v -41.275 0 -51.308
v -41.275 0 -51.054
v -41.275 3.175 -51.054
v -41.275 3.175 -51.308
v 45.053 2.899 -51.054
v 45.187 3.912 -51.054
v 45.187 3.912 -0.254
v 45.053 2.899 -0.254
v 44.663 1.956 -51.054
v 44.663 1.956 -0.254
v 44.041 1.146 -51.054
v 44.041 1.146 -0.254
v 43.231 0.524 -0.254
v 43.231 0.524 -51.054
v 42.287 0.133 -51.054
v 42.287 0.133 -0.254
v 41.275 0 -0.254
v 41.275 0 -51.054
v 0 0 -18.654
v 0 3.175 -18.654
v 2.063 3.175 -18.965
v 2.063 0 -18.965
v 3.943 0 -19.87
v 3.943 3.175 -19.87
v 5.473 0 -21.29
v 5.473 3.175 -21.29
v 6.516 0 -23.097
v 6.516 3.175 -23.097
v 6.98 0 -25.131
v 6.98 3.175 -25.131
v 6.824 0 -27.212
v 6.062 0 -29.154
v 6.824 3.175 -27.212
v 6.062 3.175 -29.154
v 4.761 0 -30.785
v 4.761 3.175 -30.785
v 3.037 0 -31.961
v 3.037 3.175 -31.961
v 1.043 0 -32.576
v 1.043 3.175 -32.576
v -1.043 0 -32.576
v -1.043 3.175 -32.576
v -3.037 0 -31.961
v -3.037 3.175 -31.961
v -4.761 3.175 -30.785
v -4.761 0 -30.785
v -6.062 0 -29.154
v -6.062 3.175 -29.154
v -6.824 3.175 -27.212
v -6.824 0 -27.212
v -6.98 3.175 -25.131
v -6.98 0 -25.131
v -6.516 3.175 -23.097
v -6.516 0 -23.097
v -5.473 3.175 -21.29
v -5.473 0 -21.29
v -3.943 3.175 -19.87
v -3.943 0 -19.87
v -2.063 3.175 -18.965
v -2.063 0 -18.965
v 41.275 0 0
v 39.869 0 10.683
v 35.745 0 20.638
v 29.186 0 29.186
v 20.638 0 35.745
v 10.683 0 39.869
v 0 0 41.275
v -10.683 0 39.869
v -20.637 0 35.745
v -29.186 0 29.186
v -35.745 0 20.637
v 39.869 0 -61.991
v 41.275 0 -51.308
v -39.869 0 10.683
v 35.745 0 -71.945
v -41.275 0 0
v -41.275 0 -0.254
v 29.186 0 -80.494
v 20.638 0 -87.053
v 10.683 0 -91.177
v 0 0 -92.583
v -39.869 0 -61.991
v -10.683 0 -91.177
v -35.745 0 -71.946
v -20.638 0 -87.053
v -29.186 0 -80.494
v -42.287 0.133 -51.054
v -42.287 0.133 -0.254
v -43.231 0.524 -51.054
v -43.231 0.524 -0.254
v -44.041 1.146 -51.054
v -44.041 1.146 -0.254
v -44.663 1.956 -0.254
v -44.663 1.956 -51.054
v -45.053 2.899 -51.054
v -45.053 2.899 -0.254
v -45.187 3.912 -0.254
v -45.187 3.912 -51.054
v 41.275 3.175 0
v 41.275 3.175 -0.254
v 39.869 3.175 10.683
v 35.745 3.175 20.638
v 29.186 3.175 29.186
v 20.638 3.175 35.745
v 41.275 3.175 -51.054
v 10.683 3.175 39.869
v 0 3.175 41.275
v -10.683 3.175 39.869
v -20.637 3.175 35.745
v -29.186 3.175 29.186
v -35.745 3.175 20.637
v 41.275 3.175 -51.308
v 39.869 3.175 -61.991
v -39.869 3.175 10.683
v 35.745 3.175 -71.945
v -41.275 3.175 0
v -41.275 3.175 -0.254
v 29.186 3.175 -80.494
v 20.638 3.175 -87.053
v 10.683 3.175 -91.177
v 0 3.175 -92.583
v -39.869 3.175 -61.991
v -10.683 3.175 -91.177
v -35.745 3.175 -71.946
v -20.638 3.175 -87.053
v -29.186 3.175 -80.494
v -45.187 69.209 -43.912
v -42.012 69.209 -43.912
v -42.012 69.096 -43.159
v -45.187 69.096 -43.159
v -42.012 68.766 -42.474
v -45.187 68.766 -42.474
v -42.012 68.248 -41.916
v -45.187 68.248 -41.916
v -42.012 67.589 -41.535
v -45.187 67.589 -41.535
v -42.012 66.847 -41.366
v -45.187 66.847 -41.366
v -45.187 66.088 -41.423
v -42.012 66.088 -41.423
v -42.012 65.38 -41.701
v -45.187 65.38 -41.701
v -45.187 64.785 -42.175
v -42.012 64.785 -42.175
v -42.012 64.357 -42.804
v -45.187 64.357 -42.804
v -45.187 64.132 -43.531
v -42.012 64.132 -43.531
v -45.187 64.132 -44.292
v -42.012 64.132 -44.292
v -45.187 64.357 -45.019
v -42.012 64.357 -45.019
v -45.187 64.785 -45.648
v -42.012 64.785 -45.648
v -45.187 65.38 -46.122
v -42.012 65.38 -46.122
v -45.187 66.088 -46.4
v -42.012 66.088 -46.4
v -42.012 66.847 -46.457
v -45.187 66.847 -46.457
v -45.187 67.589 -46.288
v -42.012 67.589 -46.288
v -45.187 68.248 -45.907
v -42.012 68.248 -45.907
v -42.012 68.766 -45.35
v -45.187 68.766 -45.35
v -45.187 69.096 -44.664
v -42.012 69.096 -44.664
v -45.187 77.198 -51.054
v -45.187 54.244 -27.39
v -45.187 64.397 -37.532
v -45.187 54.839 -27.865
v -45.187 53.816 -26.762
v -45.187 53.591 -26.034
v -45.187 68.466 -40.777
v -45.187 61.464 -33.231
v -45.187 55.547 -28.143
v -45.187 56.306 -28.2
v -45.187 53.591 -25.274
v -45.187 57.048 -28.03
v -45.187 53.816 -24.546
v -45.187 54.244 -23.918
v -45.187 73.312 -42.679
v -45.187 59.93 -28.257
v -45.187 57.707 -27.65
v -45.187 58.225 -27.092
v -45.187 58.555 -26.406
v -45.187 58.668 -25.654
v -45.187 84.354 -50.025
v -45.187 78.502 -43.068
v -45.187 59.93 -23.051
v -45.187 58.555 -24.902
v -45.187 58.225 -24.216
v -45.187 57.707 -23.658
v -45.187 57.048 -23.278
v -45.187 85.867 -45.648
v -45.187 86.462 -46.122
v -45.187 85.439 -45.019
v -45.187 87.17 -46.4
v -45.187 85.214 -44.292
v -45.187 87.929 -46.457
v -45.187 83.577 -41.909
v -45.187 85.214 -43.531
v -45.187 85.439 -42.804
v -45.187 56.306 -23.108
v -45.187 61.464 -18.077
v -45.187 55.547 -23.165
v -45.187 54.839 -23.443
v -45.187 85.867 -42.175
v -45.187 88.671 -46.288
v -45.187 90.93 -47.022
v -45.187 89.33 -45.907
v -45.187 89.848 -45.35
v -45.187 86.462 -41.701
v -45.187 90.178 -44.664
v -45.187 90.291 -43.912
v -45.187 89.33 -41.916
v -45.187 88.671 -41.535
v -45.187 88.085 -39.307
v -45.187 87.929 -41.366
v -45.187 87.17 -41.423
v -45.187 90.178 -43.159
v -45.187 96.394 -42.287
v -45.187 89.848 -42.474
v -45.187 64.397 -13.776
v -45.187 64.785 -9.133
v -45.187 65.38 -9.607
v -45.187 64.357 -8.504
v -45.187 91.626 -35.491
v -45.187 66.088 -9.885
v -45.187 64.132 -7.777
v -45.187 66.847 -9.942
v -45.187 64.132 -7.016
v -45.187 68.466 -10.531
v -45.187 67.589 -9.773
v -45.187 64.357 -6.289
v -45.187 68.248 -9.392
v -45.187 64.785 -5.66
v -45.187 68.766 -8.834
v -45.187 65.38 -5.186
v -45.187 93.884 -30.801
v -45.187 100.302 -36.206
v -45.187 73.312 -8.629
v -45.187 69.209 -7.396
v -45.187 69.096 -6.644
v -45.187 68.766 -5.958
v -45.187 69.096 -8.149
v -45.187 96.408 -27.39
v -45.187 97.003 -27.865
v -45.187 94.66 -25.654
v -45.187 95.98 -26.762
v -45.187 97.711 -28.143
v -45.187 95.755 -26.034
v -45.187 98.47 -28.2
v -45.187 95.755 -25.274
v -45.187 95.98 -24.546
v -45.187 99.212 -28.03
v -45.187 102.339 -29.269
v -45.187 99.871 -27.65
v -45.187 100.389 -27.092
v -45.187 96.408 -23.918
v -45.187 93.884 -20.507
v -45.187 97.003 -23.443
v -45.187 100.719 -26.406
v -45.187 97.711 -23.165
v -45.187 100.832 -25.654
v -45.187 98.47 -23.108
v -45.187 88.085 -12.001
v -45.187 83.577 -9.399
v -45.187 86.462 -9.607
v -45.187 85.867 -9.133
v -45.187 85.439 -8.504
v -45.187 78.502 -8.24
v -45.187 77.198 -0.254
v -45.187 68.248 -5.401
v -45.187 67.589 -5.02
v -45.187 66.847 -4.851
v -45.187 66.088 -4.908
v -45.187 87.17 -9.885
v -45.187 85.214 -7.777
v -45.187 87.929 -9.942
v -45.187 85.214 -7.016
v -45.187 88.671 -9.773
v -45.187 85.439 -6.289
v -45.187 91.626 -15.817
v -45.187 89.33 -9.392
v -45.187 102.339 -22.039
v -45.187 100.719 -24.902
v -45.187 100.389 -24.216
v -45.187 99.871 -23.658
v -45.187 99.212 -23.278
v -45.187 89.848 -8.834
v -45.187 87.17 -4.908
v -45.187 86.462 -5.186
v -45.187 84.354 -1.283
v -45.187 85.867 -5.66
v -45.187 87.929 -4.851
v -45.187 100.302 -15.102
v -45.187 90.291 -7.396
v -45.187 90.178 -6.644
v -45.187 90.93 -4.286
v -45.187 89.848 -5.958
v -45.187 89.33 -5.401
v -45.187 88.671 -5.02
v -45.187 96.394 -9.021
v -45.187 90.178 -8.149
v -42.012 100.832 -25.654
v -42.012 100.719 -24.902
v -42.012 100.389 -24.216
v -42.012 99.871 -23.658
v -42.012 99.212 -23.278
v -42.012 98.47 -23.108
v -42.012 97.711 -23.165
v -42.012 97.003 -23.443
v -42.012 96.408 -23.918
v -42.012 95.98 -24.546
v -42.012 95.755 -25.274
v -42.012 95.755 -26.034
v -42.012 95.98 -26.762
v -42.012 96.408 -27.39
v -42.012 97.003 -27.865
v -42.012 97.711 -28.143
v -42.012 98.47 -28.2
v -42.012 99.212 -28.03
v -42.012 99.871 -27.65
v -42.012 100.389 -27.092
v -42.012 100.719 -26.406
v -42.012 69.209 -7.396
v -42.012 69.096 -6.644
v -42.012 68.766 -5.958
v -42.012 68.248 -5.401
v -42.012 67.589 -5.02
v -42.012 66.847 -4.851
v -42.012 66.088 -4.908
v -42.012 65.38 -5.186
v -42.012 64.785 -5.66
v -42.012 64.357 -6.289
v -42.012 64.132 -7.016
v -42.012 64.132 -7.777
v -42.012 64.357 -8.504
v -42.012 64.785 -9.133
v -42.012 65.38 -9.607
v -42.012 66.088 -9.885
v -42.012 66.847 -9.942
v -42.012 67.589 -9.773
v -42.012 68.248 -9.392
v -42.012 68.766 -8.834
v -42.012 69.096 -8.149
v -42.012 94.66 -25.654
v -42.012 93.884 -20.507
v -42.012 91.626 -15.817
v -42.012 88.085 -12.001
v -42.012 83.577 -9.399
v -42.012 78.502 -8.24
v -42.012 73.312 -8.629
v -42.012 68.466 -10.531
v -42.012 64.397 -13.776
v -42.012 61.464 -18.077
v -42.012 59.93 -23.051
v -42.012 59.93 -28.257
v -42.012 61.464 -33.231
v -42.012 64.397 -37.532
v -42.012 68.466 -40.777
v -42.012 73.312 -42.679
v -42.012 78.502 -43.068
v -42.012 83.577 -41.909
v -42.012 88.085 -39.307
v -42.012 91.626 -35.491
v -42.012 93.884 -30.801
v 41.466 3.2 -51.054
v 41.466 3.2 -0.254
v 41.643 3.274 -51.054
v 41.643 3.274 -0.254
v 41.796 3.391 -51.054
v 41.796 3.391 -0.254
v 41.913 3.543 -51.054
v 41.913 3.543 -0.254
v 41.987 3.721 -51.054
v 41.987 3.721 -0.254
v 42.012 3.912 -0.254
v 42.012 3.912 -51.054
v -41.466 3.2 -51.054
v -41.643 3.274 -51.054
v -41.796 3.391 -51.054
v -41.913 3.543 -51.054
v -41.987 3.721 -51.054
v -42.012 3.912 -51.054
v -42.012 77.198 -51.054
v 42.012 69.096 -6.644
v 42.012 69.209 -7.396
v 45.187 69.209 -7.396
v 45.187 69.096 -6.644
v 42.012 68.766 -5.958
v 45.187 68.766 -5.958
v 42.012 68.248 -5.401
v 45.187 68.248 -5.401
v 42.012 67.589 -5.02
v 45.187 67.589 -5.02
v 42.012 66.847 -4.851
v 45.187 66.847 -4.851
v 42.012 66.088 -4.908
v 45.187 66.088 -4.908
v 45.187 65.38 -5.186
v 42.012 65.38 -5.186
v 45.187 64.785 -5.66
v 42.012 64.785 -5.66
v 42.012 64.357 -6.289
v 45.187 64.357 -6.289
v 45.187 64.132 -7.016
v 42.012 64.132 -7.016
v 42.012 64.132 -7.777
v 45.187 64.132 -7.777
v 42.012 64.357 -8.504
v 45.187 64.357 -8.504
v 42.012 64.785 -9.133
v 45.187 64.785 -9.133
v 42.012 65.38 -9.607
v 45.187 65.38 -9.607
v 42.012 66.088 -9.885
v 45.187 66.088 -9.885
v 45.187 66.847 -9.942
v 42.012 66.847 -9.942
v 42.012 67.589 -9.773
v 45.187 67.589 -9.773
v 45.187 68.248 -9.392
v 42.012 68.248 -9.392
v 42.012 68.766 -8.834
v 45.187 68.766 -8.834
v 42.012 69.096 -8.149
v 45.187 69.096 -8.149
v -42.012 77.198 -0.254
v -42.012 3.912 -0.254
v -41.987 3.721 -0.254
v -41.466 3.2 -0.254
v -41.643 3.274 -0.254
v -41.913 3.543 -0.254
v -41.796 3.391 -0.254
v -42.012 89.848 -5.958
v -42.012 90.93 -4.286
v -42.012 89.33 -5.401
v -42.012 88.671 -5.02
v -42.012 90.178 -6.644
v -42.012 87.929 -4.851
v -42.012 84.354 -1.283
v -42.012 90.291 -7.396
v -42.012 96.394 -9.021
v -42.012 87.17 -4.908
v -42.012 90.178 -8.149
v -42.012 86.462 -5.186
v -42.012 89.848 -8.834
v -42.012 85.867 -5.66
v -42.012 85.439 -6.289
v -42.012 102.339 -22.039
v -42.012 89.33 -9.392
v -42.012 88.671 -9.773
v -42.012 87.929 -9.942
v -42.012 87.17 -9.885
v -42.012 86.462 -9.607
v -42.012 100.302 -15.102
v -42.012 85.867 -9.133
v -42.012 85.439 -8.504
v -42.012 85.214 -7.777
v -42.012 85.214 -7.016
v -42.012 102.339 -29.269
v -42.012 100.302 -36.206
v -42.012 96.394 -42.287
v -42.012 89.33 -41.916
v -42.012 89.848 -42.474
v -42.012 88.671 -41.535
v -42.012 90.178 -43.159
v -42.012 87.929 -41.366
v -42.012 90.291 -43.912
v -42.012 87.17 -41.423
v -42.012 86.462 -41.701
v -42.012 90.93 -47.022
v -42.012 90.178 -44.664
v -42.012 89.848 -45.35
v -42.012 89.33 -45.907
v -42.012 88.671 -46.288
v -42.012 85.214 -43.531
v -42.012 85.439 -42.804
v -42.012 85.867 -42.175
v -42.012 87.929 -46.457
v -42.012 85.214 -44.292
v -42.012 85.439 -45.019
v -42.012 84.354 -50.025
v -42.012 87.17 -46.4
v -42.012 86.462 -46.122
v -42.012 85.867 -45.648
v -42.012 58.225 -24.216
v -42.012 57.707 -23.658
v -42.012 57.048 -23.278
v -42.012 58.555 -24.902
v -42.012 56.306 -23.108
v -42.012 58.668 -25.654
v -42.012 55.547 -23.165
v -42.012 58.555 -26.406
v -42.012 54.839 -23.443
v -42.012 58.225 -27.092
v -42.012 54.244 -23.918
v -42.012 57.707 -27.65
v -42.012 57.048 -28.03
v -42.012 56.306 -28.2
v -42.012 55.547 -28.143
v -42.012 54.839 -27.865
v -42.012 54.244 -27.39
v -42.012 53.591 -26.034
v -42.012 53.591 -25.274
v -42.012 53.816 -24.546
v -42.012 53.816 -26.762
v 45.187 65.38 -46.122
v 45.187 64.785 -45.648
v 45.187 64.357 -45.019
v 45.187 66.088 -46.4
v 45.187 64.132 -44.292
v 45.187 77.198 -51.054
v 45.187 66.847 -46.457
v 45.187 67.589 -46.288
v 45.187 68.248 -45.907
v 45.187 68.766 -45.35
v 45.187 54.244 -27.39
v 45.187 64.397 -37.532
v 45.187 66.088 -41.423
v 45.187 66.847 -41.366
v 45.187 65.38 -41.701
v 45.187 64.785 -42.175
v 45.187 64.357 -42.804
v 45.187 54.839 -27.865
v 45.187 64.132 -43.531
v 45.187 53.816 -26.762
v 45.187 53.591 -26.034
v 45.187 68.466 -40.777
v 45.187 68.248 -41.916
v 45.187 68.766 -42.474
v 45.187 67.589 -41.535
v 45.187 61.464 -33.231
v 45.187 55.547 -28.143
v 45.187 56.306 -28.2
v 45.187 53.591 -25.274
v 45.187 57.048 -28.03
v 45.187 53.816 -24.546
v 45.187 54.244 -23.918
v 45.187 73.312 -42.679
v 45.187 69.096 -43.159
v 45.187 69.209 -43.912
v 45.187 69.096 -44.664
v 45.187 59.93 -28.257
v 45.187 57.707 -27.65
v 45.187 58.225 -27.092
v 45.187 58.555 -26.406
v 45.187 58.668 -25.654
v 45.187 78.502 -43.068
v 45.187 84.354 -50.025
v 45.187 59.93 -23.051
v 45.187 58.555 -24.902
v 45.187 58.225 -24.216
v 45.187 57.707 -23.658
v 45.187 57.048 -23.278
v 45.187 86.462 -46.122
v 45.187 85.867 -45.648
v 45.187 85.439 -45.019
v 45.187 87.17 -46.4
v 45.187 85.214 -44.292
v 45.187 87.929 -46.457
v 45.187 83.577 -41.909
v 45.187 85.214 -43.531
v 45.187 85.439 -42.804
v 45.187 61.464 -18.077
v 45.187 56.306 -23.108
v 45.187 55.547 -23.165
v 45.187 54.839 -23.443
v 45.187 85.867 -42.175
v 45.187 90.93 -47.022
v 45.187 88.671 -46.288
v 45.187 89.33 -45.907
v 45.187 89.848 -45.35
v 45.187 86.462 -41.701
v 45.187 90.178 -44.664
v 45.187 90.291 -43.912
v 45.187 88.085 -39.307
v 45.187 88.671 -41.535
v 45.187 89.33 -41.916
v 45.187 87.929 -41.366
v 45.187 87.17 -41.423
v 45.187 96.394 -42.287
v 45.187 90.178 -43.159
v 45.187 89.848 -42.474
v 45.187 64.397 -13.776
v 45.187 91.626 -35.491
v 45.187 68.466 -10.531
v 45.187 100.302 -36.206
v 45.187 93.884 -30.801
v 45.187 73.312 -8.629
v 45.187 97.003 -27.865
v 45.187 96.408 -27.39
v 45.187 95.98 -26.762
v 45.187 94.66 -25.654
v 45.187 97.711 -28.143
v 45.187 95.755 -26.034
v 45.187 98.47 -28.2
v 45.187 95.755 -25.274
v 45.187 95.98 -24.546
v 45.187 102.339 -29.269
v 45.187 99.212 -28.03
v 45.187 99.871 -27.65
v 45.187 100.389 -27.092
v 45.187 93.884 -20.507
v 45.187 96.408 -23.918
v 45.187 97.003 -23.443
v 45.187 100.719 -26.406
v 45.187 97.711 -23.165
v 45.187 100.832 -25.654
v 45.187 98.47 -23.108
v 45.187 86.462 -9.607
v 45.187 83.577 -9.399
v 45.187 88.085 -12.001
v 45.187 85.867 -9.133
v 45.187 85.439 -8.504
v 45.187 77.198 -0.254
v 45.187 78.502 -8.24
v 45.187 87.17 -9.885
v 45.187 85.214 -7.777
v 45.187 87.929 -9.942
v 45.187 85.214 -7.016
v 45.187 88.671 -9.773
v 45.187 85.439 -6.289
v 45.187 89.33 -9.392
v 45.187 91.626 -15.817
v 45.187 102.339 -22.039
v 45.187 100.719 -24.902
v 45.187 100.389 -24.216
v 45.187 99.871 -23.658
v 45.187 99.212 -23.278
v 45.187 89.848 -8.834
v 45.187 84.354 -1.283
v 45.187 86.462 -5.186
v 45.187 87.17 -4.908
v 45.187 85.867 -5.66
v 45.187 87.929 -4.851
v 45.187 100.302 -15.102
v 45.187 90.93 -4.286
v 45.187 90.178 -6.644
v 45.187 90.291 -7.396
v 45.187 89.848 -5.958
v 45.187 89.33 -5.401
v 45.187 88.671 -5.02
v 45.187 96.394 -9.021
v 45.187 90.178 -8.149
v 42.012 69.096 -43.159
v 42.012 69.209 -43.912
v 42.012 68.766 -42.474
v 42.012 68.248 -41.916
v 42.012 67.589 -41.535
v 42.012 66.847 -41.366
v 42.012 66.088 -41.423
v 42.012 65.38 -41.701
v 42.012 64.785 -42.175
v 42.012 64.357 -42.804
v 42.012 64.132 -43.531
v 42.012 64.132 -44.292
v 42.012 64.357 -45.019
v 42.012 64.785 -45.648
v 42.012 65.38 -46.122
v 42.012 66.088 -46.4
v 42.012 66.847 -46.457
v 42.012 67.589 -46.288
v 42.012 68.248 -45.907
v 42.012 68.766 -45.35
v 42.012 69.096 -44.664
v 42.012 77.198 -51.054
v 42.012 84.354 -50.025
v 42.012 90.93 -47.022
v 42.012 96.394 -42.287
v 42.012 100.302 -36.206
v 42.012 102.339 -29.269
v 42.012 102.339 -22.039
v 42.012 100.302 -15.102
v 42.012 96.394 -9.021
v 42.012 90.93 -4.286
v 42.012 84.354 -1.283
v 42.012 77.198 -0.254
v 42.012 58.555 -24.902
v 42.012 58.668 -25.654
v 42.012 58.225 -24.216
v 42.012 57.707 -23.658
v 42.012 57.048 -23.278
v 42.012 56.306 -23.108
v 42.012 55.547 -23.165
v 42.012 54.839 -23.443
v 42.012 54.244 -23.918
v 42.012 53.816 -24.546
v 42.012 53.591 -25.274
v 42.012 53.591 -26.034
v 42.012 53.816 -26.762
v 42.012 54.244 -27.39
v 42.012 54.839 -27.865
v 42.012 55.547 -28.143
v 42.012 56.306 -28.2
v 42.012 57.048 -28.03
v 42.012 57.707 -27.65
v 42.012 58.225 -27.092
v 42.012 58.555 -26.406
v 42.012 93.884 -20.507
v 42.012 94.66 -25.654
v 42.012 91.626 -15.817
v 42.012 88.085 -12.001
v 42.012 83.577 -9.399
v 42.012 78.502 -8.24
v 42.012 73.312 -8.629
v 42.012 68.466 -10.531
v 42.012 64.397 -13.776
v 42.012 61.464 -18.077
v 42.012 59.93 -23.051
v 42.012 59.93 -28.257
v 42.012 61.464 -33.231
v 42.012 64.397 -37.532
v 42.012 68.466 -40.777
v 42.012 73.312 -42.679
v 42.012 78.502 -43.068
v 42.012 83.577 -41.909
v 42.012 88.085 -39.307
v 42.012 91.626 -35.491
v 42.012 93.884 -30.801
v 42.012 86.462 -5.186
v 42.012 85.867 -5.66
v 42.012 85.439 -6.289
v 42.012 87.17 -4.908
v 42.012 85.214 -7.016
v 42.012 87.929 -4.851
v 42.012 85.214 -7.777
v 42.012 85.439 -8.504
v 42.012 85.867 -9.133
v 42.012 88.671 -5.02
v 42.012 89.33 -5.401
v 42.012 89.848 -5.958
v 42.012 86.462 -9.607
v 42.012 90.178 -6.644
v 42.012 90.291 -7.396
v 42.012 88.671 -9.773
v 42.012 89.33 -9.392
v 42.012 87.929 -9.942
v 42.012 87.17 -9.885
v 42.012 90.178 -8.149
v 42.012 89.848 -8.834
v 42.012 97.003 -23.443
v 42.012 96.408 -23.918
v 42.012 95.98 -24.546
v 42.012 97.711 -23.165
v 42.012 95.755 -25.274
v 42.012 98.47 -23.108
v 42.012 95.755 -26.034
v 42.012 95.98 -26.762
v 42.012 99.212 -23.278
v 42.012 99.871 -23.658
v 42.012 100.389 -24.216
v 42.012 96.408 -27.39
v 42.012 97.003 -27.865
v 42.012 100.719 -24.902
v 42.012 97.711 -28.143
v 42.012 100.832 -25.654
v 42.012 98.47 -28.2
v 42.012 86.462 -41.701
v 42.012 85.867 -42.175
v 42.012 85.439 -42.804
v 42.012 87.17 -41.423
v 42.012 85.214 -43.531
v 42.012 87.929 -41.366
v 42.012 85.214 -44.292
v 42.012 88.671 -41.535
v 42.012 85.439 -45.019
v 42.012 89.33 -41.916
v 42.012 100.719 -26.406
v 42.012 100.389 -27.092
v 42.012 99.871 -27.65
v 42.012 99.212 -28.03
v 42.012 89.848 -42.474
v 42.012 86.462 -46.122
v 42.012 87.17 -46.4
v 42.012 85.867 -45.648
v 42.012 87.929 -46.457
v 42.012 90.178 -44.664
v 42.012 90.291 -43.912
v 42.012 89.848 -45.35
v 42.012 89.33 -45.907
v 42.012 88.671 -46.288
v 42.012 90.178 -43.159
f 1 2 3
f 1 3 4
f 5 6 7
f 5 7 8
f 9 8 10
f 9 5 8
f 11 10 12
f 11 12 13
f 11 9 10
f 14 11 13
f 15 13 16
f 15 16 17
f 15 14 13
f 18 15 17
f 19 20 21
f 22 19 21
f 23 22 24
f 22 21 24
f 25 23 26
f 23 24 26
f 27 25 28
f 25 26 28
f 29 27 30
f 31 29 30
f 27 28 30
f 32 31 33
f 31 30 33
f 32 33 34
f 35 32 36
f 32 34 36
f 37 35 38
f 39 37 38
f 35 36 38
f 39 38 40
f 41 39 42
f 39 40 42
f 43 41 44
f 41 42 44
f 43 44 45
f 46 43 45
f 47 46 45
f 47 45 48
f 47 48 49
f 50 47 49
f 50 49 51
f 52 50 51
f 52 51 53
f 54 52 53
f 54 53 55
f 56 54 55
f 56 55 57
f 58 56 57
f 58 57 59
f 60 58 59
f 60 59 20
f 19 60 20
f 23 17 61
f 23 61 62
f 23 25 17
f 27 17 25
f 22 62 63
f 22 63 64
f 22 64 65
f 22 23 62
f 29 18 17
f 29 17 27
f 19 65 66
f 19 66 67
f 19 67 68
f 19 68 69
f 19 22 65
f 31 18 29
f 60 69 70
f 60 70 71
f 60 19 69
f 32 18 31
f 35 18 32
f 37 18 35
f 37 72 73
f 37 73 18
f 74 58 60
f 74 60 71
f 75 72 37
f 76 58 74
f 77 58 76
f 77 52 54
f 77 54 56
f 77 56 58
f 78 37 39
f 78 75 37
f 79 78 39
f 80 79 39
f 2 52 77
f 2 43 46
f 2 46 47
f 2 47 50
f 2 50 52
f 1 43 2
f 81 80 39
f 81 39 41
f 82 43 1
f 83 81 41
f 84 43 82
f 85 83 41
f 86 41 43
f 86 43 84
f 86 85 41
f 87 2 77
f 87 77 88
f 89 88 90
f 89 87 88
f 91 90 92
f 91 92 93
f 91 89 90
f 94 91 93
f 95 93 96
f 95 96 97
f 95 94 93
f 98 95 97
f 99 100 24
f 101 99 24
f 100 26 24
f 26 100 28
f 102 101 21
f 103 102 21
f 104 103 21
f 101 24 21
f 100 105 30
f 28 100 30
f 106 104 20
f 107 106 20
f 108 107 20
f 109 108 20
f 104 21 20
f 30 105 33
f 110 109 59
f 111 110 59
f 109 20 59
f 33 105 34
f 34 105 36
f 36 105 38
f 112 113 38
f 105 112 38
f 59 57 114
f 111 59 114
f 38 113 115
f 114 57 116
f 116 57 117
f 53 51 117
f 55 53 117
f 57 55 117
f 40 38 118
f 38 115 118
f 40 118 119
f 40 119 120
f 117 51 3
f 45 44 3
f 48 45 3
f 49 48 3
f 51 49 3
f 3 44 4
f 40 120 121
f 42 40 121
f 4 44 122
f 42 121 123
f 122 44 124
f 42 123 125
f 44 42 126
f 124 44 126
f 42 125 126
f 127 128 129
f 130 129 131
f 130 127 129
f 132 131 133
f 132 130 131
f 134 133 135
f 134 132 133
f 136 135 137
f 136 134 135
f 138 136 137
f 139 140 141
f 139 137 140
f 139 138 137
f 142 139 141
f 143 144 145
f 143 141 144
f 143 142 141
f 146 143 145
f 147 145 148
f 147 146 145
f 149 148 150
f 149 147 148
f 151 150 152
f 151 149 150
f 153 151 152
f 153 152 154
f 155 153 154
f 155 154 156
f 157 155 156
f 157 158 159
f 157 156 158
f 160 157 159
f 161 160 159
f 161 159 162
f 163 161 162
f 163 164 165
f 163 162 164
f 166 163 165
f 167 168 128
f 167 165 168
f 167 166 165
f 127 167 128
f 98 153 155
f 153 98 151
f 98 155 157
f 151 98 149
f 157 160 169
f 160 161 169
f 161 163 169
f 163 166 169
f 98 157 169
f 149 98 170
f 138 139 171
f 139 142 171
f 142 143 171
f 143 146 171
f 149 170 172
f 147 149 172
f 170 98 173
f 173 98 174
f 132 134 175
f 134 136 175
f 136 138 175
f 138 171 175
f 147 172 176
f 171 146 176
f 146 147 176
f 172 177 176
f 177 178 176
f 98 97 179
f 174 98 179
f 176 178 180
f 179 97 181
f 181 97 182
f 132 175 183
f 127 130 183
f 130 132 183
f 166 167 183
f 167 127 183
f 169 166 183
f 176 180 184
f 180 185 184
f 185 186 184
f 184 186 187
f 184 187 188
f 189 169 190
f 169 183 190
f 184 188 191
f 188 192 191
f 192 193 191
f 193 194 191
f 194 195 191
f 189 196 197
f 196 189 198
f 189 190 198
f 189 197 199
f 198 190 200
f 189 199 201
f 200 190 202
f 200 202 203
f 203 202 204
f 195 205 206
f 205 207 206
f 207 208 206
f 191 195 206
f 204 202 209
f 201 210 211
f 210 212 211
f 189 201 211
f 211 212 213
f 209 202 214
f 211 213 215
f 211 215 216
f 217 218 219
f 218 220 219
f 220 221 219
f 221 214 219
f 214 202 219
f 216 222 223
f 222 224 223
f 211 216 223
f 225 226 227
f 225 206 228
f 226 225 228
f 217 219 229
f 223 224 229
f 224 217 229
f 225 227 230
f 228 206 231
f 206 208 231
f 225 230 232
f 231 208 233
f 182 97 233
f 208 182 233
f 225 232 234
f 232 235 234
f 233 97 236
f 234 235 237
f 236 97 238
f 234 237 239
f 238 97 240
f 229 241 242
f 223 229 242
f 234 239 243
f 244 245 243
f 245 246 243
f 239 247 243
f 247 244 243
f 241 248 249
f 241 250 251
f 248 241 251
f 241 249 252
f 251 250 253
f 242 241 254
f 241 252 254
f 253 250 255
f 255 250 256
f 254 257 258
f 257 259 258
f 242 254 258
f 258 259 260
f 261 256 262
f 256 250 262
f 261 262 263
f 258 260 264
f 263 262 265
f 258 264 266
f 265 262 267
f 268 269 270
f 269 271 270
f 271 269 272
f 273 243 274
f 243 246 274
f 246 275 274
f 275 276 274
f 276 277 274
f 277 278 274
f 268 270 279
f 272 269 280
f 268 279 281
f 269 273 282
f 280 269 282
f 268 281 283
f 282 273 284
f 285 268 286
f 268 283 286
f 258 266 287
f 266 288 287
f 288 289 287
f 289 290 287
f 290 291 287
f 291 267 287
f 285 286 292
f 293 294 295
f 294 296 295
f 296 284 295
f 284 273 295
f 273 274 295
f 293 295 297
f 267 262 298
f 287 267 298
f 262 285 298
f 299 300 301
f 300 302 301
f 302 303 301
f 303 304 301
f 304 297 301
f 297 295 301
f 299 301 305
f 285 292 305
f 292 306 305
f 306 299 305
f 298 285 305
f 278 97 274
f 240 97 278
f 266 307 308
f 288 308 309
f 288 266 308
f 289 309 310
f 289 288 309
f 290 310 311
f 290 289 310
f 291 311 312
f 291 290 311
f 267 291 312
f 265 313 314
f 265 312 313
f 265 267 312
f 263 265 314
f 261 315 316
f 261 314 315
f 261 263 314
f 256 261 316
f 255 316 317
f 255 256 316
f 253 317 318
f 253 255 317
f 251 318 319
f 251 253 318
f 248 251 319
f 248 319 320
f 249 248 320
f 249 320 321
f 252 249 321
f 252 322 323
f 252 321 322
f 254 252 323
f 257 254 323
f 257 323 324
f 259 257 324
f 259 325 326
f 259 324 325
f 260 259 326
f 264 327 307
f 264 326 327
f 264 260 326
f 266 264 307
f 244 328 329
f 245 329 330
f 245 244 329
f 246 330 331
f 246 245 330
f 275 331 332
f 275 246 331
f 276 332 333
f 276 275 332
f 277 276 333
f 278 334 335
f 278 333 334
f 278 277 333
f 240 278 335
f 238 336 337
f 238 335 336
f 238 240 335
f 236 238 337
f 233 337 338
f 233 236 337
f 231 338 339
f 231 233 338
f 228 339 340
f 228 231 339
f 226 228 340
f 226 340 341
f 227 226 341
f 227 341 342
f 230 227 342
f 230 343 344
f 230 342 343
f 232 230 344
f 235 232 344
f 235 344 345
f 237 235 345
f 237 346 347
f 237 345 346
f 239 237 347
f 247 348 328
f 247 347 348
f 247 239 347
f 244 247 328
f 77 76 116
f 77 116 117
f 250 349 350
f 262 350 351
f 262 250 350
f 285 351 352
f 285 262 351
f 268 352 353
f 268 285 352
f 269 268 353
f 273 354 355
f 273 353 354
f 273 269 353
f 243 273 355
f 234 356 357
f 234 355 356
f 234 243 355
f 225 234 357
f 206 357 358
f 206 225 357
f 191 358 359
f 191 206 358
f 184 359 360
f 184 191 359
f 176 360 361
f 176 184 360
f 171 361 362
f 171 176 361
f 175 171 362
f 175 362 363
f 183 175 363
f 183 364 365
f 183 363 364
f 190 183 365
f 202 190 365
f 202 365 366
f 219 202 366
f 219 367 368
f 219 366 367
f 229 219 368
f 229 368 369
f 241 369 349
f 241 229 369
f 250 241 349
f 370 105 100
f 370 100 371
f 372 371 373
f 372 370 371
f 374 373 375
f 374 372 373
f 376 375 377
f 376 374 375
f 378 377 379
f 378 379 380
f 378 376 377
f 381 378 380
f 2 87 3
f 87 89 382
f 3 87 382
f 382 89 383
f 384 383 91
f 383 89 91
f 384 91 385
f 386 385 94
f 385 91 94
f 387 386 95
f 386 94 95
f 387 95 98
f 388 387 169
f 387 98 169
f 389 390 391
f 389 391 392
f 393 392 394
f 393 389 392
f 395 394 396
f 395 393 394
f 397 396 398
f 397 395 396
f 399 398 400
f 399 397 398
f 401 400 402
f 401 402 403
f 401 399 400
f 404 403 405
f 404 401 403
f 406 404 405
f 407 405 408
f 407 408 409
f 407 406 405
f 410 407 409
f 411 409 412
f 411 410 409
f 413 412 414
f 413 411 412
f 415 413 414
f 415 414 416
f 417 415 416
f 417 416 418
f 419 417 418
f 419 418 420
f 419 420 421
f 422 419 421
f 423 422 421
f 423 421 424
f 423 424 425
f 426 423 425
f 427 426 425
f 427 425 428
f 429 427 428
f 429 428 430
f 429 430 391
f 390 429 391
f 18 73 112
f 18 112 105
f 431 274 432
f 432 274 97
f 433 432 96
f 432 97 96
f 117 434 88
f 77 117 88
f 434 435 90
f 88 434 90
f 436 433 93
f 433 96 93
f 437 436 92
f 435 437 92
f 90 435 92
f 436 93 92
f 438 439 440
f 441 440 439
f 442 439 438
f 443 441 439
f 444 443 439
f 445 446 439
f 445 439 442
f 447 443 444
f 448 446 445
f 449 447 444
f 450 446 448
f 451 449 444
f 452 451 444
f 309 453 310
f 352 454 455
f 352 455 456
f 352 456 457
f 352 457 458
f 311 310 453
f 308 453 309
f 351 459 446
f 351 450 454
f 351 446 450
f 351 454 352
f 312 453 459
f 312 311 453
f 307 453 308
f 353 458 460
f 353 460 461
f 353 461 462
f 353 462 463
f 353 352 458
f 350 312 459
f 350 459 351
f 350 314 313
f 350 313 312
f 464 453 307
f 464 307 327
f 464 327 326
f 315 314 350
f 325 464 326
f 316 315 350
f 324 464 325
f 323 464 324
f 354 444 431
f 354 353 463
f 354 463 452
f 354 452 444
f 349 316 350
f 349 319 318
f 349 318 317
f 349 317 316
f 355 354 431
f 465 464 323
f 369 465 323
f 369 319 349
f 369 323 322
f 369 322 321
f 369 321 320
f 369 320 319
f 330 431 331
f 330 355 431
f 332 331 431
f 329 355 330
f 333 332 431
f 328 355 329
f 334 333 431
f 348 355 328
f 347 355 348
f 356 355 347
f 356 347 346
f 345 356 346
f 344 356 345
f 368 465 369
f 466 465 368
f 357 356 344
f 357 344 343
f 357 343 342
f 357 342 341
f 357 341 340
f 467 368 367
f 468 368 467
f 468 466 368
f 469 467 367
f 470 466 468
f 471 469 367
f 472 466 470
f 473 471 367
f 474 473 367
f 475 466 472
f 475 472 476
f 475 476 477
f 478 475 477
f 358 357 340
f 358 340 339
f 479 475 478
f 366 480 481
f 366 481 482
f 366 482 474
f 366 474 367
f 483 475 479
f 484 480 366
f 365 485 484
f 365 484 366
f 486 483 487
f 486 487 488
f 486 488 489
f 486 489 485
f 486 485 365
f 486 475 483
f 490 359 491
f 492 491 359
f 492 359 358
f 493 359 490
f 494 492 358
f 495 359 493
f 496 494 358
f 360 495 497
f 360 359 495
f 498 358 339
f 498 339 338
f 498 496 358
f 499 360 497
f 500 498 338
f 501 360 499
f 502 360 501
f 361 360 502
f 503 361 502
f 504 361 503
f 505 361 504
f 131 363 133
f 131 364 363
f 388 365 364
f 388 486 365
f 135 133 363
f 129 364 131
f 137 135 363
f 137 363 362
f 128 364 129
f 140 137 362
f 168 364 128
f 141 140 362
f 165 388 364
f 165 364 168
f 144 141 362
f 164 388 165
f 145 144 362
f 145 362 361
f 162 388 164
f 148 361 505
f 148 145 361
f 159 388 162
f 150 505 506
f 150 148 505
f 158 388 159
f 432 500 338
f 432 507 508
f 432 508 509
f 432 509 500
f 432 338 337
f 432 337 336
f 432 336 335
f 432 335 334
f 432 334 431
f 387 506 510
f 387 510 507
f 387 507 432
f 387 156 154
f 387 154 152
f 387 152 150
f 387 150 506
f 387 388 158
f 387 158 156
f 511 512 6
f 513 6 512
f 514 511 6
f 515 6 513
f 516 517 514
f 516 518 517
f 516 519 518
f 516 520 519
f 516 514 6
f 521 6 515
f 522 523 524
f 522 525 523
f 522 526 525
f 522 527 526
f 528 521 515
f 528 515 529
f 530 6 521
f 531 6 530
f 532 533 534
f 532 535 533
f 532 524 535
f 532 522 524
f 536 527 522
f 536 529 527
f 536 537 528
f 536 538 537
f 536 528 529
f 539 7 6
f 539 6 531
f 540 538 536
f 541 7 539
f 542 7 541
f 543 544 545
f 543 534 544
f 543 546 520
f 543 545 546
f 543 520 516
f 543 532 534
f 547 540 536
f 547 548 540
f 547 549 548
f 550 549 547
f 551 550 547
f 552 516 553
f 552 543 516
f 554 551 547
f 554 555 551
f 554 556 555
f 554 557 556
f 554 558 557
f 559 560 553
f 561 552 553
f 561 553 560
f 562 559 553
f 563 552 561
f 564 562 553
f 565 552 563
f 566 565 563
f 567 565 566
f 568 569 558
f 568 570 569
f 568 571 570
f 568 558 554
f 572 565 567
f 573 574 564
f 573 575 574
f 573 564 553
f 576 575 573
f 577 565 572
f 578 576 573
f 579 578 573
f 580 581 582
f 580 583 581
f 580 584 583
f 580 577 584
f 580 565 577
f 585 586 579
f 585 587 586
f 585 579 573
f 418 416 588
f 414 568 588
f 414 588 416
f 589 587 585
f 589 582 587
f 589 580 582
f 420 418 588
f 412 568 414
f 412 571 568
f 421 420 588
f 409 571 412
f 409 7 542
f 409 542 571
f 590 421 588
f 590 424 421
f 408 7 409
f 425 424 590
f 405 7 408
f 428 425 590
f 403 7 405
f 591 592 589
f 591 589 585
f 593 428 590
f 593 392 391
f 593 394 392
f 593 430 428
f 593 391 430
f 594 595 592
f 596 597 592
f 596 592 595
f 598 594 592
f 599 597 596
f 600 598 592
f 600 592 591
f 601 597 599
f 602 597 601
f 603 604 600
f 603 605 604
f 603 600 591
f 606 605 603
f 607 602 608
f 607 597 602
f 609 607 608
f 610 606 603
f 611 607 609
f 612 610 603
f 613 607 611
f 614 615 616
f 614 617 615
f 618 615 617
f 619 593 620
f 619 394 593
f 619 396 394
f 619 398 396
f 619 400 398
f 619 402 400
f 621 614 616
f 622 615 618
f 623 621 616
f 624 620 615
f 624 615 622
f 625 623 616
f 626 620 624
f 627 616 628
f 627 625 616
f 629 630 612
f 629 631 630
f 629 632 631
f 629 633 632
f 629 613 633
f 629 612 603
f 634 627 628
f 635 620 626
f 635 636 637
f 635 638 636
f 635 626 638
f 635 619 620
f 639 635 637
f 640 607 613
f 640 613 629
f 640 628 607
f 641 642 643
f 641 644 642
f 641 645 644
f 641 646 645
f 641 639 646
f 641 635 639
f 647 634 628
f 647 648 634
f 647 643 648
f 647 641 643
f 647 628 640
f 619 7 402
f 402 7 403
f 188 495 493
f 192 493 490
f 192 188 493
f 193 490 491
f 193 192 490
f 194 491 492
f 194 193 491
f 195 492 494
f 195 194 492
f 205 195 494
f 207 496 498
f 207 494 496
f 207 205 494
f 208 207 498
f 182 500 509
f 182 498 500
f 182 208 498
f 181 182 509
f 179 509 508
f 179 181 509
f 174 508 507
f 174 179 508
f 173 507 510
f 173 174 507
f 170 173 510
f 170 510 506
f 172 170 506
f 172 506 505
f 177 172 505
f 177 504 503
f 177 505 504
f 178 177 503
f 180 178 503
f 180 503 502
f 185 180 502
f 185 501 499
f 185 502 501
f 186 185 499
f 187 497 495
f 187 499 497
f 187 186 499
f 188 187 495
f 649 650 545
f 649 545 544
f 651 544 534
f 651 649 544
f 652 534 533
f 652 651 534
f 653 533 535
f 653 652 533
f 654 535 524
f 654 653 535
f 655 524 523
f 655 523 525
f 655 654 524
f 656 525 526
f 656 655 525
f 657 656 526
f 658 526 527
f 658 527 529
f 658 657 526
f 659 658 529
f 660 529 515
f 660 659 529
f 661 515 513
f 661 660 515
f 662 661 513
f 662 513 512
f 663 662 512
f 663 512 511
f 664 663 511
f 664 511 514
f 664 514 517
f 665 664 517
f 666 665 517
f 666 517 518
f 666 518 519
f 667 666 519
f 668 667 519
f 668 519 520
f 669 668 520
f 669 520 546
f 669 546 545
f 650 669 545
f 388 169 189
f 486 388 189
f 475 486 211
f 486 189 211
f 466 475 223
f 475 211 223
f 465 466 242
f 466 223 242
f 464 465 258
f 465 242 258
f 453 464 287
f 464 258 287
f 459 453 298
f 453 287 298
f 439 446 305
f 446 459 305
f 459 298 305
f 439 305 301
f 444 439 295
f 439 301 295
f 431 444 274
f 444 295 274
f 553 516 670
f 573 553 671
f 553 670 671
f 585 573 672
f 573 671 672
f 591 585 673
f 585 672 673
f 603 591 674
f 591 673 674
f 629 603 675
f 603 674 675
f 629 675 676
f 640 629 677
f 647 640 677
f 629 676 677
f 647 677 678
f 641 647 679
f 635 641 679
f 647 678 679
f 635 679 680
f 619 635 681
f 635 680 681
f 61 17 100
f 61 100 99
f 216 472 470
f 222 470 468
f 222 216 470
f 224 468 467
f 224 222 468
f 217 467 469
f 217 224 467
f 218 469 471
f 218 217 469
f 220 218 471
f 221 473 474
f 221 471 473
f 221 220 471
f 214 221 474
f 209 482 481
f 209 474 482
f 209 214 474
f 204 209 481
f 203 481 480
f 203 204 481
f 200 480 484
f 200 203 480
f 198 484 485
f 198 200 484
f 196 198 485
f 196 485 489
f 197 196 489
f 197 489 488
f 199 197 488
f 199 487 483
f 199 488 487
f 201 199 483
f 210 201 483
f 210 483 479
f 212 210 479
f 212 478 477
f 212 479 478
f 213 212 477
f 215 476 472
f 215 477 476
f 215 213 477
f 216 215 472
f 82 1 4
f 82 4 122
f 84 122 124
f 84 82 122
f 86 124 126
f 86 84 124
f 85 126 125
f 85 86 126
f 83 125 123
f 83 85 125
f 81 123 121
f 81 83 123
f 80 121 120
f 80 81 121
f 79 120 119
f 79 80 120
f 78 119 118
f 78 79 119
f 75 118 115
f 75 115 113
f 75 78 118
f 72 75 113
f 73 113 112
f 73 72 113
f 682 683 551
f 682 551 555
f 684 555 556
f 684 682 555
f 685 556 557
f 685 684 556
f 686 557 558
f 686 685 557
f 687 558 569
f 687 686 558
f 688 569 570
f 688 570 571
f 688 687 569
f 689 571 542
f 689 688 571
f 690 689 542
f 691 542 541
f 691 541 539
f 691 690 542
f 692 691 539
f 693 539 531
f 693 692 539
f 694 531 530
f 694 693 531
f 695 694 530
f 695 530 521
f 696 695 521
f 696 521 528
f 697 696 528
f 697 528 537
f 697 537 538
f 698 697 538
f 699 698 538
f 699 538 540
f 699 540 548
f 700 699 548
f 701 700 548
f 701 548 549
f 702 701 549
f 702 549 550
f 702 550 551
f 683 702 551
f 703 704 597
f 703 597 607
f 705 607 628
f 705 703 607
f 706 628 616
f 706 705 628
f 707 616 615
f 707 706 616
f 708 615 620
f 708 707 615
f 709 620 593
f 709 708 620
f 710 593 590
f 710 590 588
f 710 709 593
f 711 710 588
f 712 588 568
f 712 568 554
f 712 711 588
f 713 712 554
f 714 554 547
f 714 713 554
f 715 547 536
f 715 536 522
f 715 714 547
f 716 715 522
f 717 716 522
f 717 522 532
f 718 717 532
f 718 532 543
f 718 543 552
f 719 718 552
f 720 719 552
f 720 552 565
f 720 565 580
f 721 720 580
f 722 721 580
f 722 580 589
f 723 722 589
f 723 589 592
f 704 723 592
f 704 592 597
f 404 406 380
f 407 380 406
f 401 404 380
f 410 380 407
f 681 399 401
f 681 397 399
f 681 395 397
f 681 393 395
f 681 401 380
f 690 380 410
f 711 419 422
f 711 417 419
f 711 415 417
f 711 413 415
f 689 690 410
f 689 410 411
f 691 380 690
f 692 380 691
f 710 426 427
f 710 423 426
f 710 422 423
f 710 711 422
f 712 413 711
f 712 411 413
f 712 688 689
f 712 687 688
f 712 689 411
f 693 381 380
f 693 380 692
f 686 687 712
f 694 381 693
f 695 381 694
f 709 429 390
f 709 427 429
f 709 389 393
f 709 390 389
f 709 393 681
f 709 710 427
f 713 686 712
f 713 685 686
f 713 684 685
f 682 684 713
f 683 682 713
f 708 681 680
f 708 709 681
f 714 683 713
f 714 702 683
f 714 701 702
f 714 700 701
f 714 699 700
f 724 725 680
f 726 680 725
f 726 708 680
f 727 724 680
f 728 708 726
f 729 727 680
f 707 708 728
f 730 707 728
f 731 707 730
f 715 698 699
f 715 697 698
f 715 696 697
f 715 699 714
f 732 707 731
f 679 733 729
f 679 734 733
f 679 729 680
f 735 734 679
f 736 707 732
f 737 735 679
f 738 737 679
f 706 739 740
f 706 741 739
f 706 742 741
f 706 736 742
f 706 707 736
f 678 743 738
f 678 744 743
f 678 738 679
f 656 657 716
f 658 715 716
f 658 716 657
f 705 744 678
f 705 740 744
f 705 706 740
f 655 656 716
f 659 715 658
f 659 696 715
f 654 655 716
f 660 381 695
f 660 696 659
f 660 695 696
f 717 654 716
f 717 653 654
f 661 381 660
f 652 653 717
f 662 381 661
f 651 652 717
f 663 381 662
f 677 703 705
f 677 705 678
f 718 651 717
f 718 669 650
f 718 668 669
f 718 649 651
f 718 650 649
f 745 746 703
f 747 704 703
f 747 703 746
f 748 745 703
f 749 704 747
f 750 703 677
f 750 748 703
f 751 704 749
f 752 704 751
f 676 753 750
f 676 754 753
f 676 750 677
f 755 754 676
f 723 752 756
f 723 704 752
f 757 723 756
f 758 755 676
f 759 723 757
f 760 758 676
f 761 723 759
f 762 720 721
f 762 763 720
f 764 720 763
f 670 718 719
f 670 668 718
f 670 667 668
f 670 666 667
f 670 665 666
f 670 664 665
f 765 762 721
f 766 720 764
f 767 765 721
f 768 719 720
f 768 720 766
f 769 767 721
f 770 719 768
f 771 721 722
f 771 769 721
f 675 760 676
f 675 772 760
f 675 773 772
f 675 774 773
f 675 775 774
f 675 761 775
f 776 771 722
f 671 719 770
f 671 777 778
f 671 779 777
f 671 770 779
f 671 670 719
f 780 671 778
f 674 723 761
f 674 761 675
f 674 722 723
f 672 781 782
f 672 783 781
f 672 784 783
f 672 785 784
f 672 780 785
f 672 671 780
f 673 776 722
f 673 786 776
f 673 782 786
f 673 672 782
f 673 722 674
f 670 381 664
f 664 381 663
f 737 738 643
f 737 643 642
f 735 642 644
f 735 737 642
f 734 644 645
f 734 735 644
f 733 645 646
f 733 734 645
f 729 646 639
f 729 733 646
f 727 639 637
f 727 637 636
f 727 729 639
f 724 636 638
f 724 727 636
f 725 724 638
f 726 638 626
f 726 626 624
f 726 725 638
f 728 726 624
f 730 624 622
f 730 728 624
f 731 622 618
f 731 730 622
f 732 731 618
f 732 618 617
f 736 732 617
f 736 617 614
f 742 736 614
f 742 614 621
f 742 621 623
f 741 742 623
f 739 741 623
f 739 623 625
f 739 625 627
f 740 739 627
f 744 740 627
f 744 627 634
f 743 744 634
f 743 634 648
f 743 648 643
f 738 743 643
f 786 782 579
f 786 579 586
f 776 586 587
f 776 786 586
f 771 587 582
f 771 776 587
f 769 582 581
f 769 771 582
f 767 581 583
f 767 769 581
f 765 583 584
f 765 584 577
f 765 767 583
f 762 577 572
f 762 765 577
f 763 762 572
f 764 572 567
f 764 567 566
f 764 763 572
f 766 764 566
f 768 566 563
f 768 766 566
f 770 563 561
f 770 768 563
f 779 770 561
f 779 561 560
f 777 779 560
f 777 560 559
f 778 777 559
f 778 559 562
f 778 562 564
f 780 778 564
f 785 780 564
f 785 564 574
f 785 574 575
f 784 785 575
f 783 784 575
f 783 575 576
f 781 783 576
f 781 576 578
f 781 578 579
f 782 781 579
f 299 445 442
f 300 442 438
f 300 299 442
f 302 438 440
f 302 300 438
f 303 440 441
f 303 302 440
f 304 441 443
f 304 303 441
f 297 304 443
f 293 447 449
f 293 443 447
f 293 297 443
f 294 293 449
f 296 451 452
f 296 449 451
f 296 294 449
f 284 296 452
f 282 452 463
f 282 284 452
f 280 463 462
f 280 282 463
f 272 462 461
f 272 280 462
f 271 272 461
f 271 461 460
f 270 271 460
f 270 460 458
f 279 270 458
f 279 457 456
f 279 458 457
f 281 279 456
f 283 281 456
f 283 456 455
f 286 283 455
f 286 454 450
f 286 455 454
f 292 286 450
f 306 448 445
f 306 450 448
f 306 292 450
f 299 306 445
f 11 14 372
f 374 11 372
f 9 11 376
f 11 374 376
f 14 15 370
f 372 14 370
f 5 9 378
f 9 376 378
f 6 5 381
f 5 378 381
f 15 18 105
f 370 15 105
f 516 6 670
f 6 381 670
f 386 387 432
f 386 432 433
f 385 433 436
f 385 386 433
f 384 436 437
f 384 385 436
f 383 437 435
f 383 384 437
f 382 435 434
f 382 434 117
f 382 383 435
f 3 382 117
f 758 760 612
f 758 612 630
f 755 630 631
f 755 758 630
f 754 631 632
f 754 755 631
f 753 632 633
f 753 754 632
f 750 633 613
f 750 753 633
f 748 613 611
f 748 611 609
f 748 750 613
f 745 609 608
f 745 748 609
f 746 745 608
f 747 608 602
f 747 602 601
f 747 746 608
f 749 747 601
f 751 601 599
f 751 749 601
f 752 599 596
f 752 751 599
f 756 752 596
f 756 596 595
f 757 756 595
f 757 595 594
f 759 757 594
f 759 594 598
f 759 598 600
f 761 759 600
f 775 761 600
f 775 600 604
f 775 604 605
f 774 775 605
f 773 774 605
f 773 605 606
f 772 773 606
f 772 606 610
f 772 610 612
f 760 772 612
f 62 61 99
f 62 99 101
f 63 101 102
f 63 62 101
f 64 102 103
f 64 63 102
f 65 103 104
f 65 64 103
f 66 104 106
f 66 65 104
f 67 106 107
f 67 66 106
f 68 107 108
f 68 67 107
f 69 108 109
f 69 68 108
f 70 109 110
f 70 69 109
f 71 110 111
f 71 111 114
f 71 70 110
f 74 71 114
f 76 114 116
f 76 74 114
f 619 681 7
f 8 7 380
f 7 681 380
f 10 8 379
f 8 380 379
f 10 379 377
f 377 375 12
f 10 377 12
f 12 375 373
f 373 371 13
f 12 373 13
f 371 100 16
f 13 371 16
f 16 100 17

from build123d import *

# Parameters (mm, degrees)
BOSS_EXTRUDE1_DEPTH             = 3.175
SKETCH2_R                       = 17.4625
CUT_EXTRUDE1_DEPTH              = 171.897583858
F_10_CLEARANCE_HOLE1_AT_2_COUNT = 2
F_10_CLEARANCE_HOLE1_AT_2_PITCH = 21.082
F_10_CLEARANCE_HOLE1_AT_3_COUNT = 2
F_10_CLEARANCE_HOLE1_AT_3_PITCH = 36.515095125
F_10_CLEARANCE_HOLE1_AT_4_COUNT = 2
F_10_CLEARANCE_HOLE1_AT_4_PITCH = 42.164
F_10_CLEARANCE_HOLE1_AT_5_COUNT = 2
F_10_CLEARANCE_HOLE1_AT_5_PITCH = 36.515095125
F_10_CLEARANCE_HOLE1_AT_6_COUNT = 2
F_10_CLEARANCE_HOLE1_AT_6_PITCH = 21.082
SKETCHED_START                  = -145
SKETCHED_BEND1_OUTLINE_W        = 3.175
SKETCHED_BEND1_OUTLINE_H        = 50.8
SKETCHED_BEND1_DEPTH            = 99.8134
SKETCHED_START_2                = 45.1866
SKETCHED_BEND1_2_OUTLINE_W      = 3.175
SKETCHED_BEND1_2_OUTLINE_H      = 50.8
SKETCHED_BEND1_2_DEPTH          = 99.8134
SKETCHED_START_3                = -44.806157784
SKETCHED_BEND1_3_OUTLINE_R      = 2.5527
SKETCHED_BEND1_3_OUTLINE_R_2    = 17.4625
SKETCHED_BEND1_3_DEPTH          = 2.794557784
SKETCHED_START_4                = 42.0116
SKETCHED_BEND1_4_OUTLINE_R      = 2.5527
SKETCHED_BEND1_4_OUTLINE_R_2    = 17.4625
SKETCHED_BEND1_4_DEPTH          = 2.794557784
SKETCHED_START_5                = -45.1866
SKETCHED_BEND1_5_OUTLINE_R      = 2.5527
SKETCHED_BEND1_5_OUTLINE_R_2    = 17.4625
SKETCHED_BEND1_5_DEPTH          = 3.9116
SKETCHED_START_6                = 41.275
SKETCHED_BEND1_6_OUTLINE_R      = 2.5527
SKETCHED_BEND1_6_OUTLINE_R_2    = 17.4625
SKETCHED_BEND1_6_DEPTH          = 3.9116
SKETCHED_START_7                = -51.054
SKETCHED_BEND1_7_DEPTH          = 50.8
SKETCH7_R                       = 7
CUT_EXTRUDE2_DEPTH              = 144.172192314


with BuildPart() as part:
    # Sketch1 → Boss-Extrude1 (new body)
    with BuildSketch(Plane(origin=(0, 0, 0), x_dir=(1, 0, 0), z_dir=(0, 1, 0))):
        with BuildLine():
            Line((-41.275, 0), (-41.275, 0.254))
            Line((-41.275, 0.254), (-118.2116, 0.254))
            ThreePointArc((-118.2116, 0.254), (-143.6116, 25.654), (-118.2116, 51.054))
            Line((-118.2116, 51.054), (-41.275, 51.054))
            Line((-41.275, 51.054), (-41.275, 51.308))
            ThreePointArc((-41.275, 51.308), (0, 92.583), (41.275, 51.308))
            Line((41.275, 51.308), (41.275, 51.054))
            Line((41.275, 51.054), (118.2116, 51.054))
            ThreePointArc((118.2116, 51.054), (143.6116, 25.654), (118.2116, 0.254))
            Line((118.2116, 0.254), (41.275, 0.254))
            Line((41.275, 0.254), (41.275, 0))
            ThreePointArc((41.275, 0), (0, -41.275), (-41.275, 0))
        make_face()
    extrude(amount=BOSS_EXTRUDE1_DEPTH)

    # Sketch2 → Cut-Extrude1 (cut, through all)
    with BuildSketch(Plane(origin=(0, 3.175, 0), x_dir=(1, 0, 0), z_dir=(0, 1, 0))):
        with Locations(Location((-118.2116, 25.654, 0), (0, 0, 270))):
            Circle(SKETCH2_R)
    cut_extrude1 = extrude(amount=-CUT_EXTRUDE1_DEPTH, mode=Mode.SUBTRACT)

    # Sketch5 → #10 Clearance Hole1 (revolve, cut)
    with BuildSketch(Plane(origin=(-97.1296, 3.175, -25.654), x_dir=(0, 0, 1), z_dir=(1, 0, 0))):
        Polygon((0, 0), (0, 39.633816902), (2.5527, 38.1), (2.5527, 0), align=None)
    f_10_clearance_hole1 = revolve(axis=Axis((-97.1296, 9.525, -25.654), (0, -1, 0)), mode=Mode.SUBTRACT)

    # #10 Clearance Hole1 at 2: #10 Clearance Hole1 ×2
    with Locations(*[Vector(-0.5000000000000003, 0, -0.8660254037844385) * (i * F_10_CLEARANCE_HOLE1_AT_2_PITCH) for i in range(1, F_10_CLEARANCE_HOLE1_AT_2_COUNT)]):
        add(f_10_clearance_hole1, mode=Mode.SUBTRACT)

    # #10 Clearance Hole1 at 3: #10 Clearance Hole1 ×2
    with Locations(*[Vector(-0.8660254037844388, 0, -0.4999999999999998) * (i * F_10_CLEARANCE_HOLE1_AT_3_PITCH) for i in range(1, F_10_CLEARANCE_HOLE1_AT_3_COUNT)]):
        add(f_10_clearance_hole1, mode=Mode.SUBTRACT)

    # #10 Clearance Hole1 at 4: #10 Clearance Hole1 ×2
    with Locations(*[(-i * F_10_CLEARANCE_HOLE1_AT_4_PITCH, 0, 0) for i in range(1, F_10_CLEARANCE_HOLE1_AT_4_COUNT)]):
        add(f_10_clearance_hole1, mode=Mode.SUBTRACT)

    # #10 Clearance Hole1 at 5: #10 Clearance Hole1 ×2
    with Locations(*[Vector(-0.8660254037844386, 0, 0.5000000000000002) * (i * F_10_CLEARANCE_HOLE1_AT_5_PITCH) for i in range(1, F_10_CLEARANCE_HOLE1_AT_5_COUNT)]):
        add(f_10_clearance_hole1, mode=Mode.SUBTRACT)

    # #10 Clearance Hole1 at 6: #10 Clearance Hole1 ×2
    with Locations(*[Vector(-0.5000000000000003, 0, 0.8660254037844385) * (i * F_10_CLEARANCE_HOLE1_AT_6_PITCH) for i in range(1, F_10_CLEARANCE_HOLE1_AT_6_COUNT)]):
        add(f_10_clearance_hole1, mode=Mode.SUBTRACT)

    # Mirror1: Cut-Extrude1, #10 Clearance Hole1 across plane
    add(cut_extrude1.mirror(Plane(origin=(0, 0, 0), x_dir=(0, 0, 1), z_dir=(1, 0, 0))), mode=Mode.SUBTRACT)
    add(f_10_clearance_hole1.mirror(Plane(origin=(0, 0, 0), x_dir=(0, 0, 1), z_dir=(1, 0, 0))), mode=Mode.SUBTRACT)

    # Mirror1 copy 1 sketch → Mirror1 copy 1 (revolve, cut)
    with BuildSketch(Plane(origin=(107.6706, 3.175, -43.911547563), x_dir=(0, 0, 1), z_dir=(-1, 0, 0))):
        Polygon((0, 0), (0, -39.633816902), (2.5527, -38.1), (2.5527, 0), align=None)
    revolve(axis=Axis((107.6706, 9.525, -43.911547563), (0, 1, 0)), mode=Mode.SUBTRACT)

    # Mirror1 copy 2 sketch → Mirror1 copy 2 (revolve, cut)
    with BuildSketch(Plane(origin=(128.7526, 3.175, -43.911547563), x_dir=(0, 0, 1), z_dir=(-1, 0, 0))):
        Polygon((0, 0), (0, -39.633816902), (2.5527, -38.1), (2.5527, 0), align=None)
    revolve(axis=Axis((128.7526, 9.525, -43.911547563), (0, 1, 0)), mode=Mode.SUBTRACT)

    # Mirror1 copy 3 sketch → Mirror1 copy 3 (revolve, cut)
    with BuildSketch(Plane(origin=(139.2936, 3.175, -25.654), x_dir=(0, 0, 1), z_dir=(-1, 0, 0))):
        Polygon((0, 0), (0, -39.633816902), (2.5527, -38.1), (2.5527, 0), align=None)
    revolve(axis=Axis((139.2936, 9.525, -25.654), (0, 1, 0)), mode=Mode.SUBTRACT)

    # Mirror1 copy 4 sketch → Mirror1 copy 4 (revolve, cut)
    with BuildSketch(Plane(origin=(128.7526, 3.175, -7.396452437), x_dir=(0, 0, 1), z_dir=(-1, 0, 0))):
        Polygon((0, 0), (0, -39.633816902), (2.5527, -38.1), (2.5527, 0), align=None)
    revolve(axis=Axis((128.7526, 9.525, -7.396452437), (0, 1, 0)), mode=Mode.SUBTRACT)

    # Mirror1 copy 5 sketch → Mirror1 copy 5 (revolve, cut)
    with BuildSketch(Plane(origin=(107.6706, 3.175, -7.396452437), x_dir=(0, 0, 1), z_dir=(-1, 0, 0))):
        Polygon((0, 0), (0, -39.633816902), (2.5527, -38.1), (2.5527, 0), align=None)
    revolve(axis=Axis((107.6706, 9.525, -7.396452437), (0, 1, 0)), mode=Mode.SUBTRACT)

    # Sketched Bend1: read off the stored shape, not the designer's step
    # Sketched Bend1 outline → Sketched Bend1 (cut)
    with BuildSketch(Plane.YZ.offset(SKETCHED_START)):
        with Locations((1.5875, -25.654)):
            Rectangle(SKETCHED_BEND1_OUTLINE_W, SKETCHED_BEND1_OUTLINE_H)
    extrude(amount=SKETCHED_BEND1_DEPTH, mode=Mode.SUBTRACT)

    # Sketched Bend1 2 outline → Sketched Bend1 2 (cut)
    with BuildSketch(Plane.YZ.offset(SKETCHED_START_2)):
        with Locations((1.5875, -25.654)):
            Rectangle(SKETCHED_BEND1_2_OUTLINE_W, SKETCHED_BEND1_2_OUTLINE_H)
    extrude(amount=SKETCHED_BEND1_2_DEPTH, mode=Mode.SUBTRACT)

    # Sketched Bend1 3 outline → Sketched Bend1 3 (add)
    with BuildSketch(Plane.YZ.offset(SKETCHED_START_3)):
        with BuildLine():
            Line((77.197512257, -0.254), (3.175, -0.254))
            Line((3.175, -0.254), (3.175, -51.054))
            Line((3.175, -51.054), (77.197512257, -51.054))
            ThreePointArc((77.197512257, -51.054), (102.597512257, -25.654), (77.197512257, -0.254))
        make_face()
        with Locations((66.656512257, -43.911547563)):
            Circle(SKETCHED_BEND1_3_OUTLINE_R, mode=Mode.SUBTRACT)
        with Locations((87.738512257, -43.911547563)):
            Circle(SKETCHED_BEND1_3_OUTLINE_R, mode=Mode.SUBTRACT)
        with Locations((56.115512257, -25.654)):
            Circle(SKETCHED_BEND1_3_OUTLINE_R, mode=Mode.SUBTRACT)
        with Locations((77.197512257, -25.654)):
            Circle(SKETCHED_BEND1_3_OUTLINE_R_2, mode=Mode.SUBTRACT)
        with Locations((98.279512257, -25.654)):
            Circle(SKETCHED_BEND1_3_OUTLINE_R, mode=Mode.SUBTRACT)
        with Locations((66.656512257, -7.396452437)):
            Circle(SKETCHED_BEND1_3_OUTLINE_R, mode=Mode.SUBTRACT)
        with Locations((87.738512257, -7.396452437)):
            Circle(SKETCHED_BEND1_3_OUTLINE_R, mode=Mode.SUBTRACT)
    extrude(amount=SKETCHED_BEND1_3_DEPTH)

    # Sketched Bend1 4 outline → Sketched Bend1 4 (add)
    with BuildSketch(Plane.YZ.offset(SKETCHED_START_4)):
        with BuildLine():
            Line((77.197512257, -0.254), (3.175, -0.254))
            Line((3.175, -0.254), (3.175, -51.054))
            Line((3.175, -51.054), (77.197512257, -51.054))
            ThreePointArc((77.197512257, -51.054), (102.597512257, -25.654), (77.197512257, -0.254))
        make_face()
        with Locations((66.656512257, -43.911547563)):
            Circle(SKETCHED_BEND1_4_OUTLINE_R, mode=Mode.SUBTRACT)
        with Locations((87.738512257, -43.911547563)):
            Circle(SKETCHED_BEND1_4_OUTLINE_R, mode=Mode.SUBTRACT)
        with Locations((56.115512257, -25.654)):
            Circle(SKETCHED_BEND1_4_OUTLINE_R, mode=Mode.SUBTRACT)
        with Locations((77.197512257, -25.654)):
            Circle(SKETCHED_BEND1_4_OUTLINE_R_2, mode=Mode.SUBTRACT)
        with Locations((98.279512257, -25.654)):
            Circle(SKETCHED_BEND1_4_OUTLINE_R, mode=Mode.SUBTRACT)
        with Locations((66.656512257, -7.396452437)):
            Circle(SKETCHED_BEND1_4_OUTLINE_R, mode=Mode.SUBTRACT)
        with Locations((87.738512257, -7.396452437)):
            Circle(SKETCHED_BEND1_4_OUTLINE_R, mode=Mode.SUBTRACT)
    extrude(amount=SKETCHED_BEND1_4_DEPTH)

    # Sketched Bend1 5 outline → Sketched Bend1 5 (add)
    with BuildSketch(Plane.YZ.offset(SKETCHED_START_5)):
        with BuildLine():
            Line((77.197512257, -0.254), (3.175, -0.254))
            Line((3.175, -0.254), (3.175, -51.054))
            Line((3.175, -51.054), (77.197512257, -51.054))
            ThreePointArc((77.197512257, -51.054), (102.597512257, -25.654), (77.197512257, -0.254))
        make_face()
        with Locations((66.656512257, -43.911547563)):
            Circle(SKETCHED_BEND1_5_OUTLINE_R, mode=Mode.SUBTRACT)
        with Locations((87.738512257, -43.911547563)):
            Circle(SKETCHED_BEND1_5_OUTLINE_R, mode=Mode.SUBTRACT)
        with Locations((56.115512257, -25.654)):
            Circle(SKETCHED_BEND1_5_OUTLINE_R, mode=Mode.SUBTRACT)
        with Locations((77.197512257, -25.654)):
            Circle(SKETCHED_BEND1_5_OUTLINE_R_2, mode=Mode.SUBTRACT)
        with Locations((98.279512257, -25.654)):
            Circle(SKETCHED_BEND1_5_OUTLINE_R, mode=Mode.SUBTRACT)
        with Locations((66.656512257, -7.396452437)):
            Circle(SKETCHED_BEND1_5_OUTLINE_R, mode=Mode.SUBTRACT)
        with Locations((87.738512257, -7.396452437)):
            Circle(SKETCHED_BEND1_5_OUTLINE_R, mode=Mode.SUBTRACT)
    extrude(amount=SKETCHED_BEND1_5_DEPTH)

    # Sketched Bend1 6 outline → Sketched Bend1 6 (add)
    with BuildSketch(Plane.YZ.offset(SKETCHED_START_6)):
        with BuildLine():
            Line((77.197512257, -0.254), (3.175, -0.254))
            Line((3.175, -0.254), (3.175, -51.054))
            Line((3.175, -51.054), (77.197512257, -51.054))
            ThreePointArc((77.197512257, -51.054), (102.597512257, -25.654), (77.197512257, -0.254))
        make_face()
        with Locations((66.656512257, -43.911547563)):
            Circle(SKETCHED_BEND1_6_OUTLINE_R, mode=Mode.SUBTRACT)
        with Locations((87.738512257, -43.911547563)):
            Circle(SKETCHED_BEND1_6_OUTLINE_R, mode=Mode.SUBTRACT)
        with Locations((56.115512257, -25.654)):
            Circle(SKETCHED_BEND1_6_OUTLINE_R, mode=Mode.SUBTRACT)
        with Locations((77.197512257, -25.654)):
            Circle(SKETCHED_BEND1_6_OUTLINE_R_2, mode=Mode.SUBTRACT)
        with Locations((98.279512257, -25.654)):
            Circle(SKETCHED_BEND1_6_OUTLINE_R, mode=Mode.SUBTRACT)
        with Locations((66.656512257, -7.396452437)):
            Circle(SKETCHED_BEND1_6_OUTLINE_R, mode=Mode.SUBTRACT)
        with Locations((87.738512257, -7.396452437)):
            Circle(SKETCHED_BEND1_6_OUTLINE_R, mode=Mode.SUBTRACT)
    extrude(amount=SKETCHED_BEND1_6_DEPTH)

    # Sketched Bend1 7 outline → Sketched Bend1 7 (cut)
    with BuildSketch(Plane.XY.offset(SKETCHED_START_7)):
        with BuildLine():
            Line((-42.0116, 104), (-42.0116, 3.9116))
            ThreePointArc((-42.0116, 3.9116), (-41.795854855, 3.390745145), (-41.275, 3.175))
            Line((-41.275, 3.175), (-41.275, 104))
            Line((-41.275, 104), (-42.0116, 104))
        make_face()
        with BuildLine():
            Line((-45.1866, 3.9116), (-45.186600025, 104))
            Line((-45.186600025, 104), (-47, 104))
            Line((-47, 104), (-47, -2.2e-08))
            Line((-47, -2.2e-08), (-41.275, 0))
            ThreePointArc((-41.275, 0), (-44.040918885, 1.145681115), (-45.1866, 3.9116))
        make_face()
        with BuildLine():
            Line((42.0116, 104), (41.275, 104))
            Line((41.275, 104), (41.275, 3.175))
            ThreePointArc((41.275, 3.175), (41.795854855, 3.390745145), (42.0116, 3.9116))
            Line((42.0116, 3.9116), (42.0116, 104))
        make_face()
        with BuildLine():
            Line((47, 104), (45.186600025, 104))
            Line((45.186600025, 104), (45.1866, 3.9116))
            ThreePointArc((45.1866, 3.9116), (44.040918885, 1.145681115), (41.275, 0))
            Line((41.275, 0), (47, -2.2e-08))
            Line((47, -2.2e-08), (47, 104))
        make_face()
    extrude(amount=SKETCHED_BEND1_7_DEPTH, mode=Mode.SUBTRACT)

    # Sketch7 → Cut-Extrude2 (cut, through all)
    with BuildSketch(Plane(origin=(0, 3.175, 0), x_dir=(1, 0, 0), z_dir=(0, 1, 0))):
        with Locations(Location((0, 25.654, 0), (0, 0, 270))):
            Circle(SKETCH7_R)
    extrude(amount=-CUT_EXTRUDE2_DEPTH, mode=Mode.SUBTRACT)


solid = part.part
